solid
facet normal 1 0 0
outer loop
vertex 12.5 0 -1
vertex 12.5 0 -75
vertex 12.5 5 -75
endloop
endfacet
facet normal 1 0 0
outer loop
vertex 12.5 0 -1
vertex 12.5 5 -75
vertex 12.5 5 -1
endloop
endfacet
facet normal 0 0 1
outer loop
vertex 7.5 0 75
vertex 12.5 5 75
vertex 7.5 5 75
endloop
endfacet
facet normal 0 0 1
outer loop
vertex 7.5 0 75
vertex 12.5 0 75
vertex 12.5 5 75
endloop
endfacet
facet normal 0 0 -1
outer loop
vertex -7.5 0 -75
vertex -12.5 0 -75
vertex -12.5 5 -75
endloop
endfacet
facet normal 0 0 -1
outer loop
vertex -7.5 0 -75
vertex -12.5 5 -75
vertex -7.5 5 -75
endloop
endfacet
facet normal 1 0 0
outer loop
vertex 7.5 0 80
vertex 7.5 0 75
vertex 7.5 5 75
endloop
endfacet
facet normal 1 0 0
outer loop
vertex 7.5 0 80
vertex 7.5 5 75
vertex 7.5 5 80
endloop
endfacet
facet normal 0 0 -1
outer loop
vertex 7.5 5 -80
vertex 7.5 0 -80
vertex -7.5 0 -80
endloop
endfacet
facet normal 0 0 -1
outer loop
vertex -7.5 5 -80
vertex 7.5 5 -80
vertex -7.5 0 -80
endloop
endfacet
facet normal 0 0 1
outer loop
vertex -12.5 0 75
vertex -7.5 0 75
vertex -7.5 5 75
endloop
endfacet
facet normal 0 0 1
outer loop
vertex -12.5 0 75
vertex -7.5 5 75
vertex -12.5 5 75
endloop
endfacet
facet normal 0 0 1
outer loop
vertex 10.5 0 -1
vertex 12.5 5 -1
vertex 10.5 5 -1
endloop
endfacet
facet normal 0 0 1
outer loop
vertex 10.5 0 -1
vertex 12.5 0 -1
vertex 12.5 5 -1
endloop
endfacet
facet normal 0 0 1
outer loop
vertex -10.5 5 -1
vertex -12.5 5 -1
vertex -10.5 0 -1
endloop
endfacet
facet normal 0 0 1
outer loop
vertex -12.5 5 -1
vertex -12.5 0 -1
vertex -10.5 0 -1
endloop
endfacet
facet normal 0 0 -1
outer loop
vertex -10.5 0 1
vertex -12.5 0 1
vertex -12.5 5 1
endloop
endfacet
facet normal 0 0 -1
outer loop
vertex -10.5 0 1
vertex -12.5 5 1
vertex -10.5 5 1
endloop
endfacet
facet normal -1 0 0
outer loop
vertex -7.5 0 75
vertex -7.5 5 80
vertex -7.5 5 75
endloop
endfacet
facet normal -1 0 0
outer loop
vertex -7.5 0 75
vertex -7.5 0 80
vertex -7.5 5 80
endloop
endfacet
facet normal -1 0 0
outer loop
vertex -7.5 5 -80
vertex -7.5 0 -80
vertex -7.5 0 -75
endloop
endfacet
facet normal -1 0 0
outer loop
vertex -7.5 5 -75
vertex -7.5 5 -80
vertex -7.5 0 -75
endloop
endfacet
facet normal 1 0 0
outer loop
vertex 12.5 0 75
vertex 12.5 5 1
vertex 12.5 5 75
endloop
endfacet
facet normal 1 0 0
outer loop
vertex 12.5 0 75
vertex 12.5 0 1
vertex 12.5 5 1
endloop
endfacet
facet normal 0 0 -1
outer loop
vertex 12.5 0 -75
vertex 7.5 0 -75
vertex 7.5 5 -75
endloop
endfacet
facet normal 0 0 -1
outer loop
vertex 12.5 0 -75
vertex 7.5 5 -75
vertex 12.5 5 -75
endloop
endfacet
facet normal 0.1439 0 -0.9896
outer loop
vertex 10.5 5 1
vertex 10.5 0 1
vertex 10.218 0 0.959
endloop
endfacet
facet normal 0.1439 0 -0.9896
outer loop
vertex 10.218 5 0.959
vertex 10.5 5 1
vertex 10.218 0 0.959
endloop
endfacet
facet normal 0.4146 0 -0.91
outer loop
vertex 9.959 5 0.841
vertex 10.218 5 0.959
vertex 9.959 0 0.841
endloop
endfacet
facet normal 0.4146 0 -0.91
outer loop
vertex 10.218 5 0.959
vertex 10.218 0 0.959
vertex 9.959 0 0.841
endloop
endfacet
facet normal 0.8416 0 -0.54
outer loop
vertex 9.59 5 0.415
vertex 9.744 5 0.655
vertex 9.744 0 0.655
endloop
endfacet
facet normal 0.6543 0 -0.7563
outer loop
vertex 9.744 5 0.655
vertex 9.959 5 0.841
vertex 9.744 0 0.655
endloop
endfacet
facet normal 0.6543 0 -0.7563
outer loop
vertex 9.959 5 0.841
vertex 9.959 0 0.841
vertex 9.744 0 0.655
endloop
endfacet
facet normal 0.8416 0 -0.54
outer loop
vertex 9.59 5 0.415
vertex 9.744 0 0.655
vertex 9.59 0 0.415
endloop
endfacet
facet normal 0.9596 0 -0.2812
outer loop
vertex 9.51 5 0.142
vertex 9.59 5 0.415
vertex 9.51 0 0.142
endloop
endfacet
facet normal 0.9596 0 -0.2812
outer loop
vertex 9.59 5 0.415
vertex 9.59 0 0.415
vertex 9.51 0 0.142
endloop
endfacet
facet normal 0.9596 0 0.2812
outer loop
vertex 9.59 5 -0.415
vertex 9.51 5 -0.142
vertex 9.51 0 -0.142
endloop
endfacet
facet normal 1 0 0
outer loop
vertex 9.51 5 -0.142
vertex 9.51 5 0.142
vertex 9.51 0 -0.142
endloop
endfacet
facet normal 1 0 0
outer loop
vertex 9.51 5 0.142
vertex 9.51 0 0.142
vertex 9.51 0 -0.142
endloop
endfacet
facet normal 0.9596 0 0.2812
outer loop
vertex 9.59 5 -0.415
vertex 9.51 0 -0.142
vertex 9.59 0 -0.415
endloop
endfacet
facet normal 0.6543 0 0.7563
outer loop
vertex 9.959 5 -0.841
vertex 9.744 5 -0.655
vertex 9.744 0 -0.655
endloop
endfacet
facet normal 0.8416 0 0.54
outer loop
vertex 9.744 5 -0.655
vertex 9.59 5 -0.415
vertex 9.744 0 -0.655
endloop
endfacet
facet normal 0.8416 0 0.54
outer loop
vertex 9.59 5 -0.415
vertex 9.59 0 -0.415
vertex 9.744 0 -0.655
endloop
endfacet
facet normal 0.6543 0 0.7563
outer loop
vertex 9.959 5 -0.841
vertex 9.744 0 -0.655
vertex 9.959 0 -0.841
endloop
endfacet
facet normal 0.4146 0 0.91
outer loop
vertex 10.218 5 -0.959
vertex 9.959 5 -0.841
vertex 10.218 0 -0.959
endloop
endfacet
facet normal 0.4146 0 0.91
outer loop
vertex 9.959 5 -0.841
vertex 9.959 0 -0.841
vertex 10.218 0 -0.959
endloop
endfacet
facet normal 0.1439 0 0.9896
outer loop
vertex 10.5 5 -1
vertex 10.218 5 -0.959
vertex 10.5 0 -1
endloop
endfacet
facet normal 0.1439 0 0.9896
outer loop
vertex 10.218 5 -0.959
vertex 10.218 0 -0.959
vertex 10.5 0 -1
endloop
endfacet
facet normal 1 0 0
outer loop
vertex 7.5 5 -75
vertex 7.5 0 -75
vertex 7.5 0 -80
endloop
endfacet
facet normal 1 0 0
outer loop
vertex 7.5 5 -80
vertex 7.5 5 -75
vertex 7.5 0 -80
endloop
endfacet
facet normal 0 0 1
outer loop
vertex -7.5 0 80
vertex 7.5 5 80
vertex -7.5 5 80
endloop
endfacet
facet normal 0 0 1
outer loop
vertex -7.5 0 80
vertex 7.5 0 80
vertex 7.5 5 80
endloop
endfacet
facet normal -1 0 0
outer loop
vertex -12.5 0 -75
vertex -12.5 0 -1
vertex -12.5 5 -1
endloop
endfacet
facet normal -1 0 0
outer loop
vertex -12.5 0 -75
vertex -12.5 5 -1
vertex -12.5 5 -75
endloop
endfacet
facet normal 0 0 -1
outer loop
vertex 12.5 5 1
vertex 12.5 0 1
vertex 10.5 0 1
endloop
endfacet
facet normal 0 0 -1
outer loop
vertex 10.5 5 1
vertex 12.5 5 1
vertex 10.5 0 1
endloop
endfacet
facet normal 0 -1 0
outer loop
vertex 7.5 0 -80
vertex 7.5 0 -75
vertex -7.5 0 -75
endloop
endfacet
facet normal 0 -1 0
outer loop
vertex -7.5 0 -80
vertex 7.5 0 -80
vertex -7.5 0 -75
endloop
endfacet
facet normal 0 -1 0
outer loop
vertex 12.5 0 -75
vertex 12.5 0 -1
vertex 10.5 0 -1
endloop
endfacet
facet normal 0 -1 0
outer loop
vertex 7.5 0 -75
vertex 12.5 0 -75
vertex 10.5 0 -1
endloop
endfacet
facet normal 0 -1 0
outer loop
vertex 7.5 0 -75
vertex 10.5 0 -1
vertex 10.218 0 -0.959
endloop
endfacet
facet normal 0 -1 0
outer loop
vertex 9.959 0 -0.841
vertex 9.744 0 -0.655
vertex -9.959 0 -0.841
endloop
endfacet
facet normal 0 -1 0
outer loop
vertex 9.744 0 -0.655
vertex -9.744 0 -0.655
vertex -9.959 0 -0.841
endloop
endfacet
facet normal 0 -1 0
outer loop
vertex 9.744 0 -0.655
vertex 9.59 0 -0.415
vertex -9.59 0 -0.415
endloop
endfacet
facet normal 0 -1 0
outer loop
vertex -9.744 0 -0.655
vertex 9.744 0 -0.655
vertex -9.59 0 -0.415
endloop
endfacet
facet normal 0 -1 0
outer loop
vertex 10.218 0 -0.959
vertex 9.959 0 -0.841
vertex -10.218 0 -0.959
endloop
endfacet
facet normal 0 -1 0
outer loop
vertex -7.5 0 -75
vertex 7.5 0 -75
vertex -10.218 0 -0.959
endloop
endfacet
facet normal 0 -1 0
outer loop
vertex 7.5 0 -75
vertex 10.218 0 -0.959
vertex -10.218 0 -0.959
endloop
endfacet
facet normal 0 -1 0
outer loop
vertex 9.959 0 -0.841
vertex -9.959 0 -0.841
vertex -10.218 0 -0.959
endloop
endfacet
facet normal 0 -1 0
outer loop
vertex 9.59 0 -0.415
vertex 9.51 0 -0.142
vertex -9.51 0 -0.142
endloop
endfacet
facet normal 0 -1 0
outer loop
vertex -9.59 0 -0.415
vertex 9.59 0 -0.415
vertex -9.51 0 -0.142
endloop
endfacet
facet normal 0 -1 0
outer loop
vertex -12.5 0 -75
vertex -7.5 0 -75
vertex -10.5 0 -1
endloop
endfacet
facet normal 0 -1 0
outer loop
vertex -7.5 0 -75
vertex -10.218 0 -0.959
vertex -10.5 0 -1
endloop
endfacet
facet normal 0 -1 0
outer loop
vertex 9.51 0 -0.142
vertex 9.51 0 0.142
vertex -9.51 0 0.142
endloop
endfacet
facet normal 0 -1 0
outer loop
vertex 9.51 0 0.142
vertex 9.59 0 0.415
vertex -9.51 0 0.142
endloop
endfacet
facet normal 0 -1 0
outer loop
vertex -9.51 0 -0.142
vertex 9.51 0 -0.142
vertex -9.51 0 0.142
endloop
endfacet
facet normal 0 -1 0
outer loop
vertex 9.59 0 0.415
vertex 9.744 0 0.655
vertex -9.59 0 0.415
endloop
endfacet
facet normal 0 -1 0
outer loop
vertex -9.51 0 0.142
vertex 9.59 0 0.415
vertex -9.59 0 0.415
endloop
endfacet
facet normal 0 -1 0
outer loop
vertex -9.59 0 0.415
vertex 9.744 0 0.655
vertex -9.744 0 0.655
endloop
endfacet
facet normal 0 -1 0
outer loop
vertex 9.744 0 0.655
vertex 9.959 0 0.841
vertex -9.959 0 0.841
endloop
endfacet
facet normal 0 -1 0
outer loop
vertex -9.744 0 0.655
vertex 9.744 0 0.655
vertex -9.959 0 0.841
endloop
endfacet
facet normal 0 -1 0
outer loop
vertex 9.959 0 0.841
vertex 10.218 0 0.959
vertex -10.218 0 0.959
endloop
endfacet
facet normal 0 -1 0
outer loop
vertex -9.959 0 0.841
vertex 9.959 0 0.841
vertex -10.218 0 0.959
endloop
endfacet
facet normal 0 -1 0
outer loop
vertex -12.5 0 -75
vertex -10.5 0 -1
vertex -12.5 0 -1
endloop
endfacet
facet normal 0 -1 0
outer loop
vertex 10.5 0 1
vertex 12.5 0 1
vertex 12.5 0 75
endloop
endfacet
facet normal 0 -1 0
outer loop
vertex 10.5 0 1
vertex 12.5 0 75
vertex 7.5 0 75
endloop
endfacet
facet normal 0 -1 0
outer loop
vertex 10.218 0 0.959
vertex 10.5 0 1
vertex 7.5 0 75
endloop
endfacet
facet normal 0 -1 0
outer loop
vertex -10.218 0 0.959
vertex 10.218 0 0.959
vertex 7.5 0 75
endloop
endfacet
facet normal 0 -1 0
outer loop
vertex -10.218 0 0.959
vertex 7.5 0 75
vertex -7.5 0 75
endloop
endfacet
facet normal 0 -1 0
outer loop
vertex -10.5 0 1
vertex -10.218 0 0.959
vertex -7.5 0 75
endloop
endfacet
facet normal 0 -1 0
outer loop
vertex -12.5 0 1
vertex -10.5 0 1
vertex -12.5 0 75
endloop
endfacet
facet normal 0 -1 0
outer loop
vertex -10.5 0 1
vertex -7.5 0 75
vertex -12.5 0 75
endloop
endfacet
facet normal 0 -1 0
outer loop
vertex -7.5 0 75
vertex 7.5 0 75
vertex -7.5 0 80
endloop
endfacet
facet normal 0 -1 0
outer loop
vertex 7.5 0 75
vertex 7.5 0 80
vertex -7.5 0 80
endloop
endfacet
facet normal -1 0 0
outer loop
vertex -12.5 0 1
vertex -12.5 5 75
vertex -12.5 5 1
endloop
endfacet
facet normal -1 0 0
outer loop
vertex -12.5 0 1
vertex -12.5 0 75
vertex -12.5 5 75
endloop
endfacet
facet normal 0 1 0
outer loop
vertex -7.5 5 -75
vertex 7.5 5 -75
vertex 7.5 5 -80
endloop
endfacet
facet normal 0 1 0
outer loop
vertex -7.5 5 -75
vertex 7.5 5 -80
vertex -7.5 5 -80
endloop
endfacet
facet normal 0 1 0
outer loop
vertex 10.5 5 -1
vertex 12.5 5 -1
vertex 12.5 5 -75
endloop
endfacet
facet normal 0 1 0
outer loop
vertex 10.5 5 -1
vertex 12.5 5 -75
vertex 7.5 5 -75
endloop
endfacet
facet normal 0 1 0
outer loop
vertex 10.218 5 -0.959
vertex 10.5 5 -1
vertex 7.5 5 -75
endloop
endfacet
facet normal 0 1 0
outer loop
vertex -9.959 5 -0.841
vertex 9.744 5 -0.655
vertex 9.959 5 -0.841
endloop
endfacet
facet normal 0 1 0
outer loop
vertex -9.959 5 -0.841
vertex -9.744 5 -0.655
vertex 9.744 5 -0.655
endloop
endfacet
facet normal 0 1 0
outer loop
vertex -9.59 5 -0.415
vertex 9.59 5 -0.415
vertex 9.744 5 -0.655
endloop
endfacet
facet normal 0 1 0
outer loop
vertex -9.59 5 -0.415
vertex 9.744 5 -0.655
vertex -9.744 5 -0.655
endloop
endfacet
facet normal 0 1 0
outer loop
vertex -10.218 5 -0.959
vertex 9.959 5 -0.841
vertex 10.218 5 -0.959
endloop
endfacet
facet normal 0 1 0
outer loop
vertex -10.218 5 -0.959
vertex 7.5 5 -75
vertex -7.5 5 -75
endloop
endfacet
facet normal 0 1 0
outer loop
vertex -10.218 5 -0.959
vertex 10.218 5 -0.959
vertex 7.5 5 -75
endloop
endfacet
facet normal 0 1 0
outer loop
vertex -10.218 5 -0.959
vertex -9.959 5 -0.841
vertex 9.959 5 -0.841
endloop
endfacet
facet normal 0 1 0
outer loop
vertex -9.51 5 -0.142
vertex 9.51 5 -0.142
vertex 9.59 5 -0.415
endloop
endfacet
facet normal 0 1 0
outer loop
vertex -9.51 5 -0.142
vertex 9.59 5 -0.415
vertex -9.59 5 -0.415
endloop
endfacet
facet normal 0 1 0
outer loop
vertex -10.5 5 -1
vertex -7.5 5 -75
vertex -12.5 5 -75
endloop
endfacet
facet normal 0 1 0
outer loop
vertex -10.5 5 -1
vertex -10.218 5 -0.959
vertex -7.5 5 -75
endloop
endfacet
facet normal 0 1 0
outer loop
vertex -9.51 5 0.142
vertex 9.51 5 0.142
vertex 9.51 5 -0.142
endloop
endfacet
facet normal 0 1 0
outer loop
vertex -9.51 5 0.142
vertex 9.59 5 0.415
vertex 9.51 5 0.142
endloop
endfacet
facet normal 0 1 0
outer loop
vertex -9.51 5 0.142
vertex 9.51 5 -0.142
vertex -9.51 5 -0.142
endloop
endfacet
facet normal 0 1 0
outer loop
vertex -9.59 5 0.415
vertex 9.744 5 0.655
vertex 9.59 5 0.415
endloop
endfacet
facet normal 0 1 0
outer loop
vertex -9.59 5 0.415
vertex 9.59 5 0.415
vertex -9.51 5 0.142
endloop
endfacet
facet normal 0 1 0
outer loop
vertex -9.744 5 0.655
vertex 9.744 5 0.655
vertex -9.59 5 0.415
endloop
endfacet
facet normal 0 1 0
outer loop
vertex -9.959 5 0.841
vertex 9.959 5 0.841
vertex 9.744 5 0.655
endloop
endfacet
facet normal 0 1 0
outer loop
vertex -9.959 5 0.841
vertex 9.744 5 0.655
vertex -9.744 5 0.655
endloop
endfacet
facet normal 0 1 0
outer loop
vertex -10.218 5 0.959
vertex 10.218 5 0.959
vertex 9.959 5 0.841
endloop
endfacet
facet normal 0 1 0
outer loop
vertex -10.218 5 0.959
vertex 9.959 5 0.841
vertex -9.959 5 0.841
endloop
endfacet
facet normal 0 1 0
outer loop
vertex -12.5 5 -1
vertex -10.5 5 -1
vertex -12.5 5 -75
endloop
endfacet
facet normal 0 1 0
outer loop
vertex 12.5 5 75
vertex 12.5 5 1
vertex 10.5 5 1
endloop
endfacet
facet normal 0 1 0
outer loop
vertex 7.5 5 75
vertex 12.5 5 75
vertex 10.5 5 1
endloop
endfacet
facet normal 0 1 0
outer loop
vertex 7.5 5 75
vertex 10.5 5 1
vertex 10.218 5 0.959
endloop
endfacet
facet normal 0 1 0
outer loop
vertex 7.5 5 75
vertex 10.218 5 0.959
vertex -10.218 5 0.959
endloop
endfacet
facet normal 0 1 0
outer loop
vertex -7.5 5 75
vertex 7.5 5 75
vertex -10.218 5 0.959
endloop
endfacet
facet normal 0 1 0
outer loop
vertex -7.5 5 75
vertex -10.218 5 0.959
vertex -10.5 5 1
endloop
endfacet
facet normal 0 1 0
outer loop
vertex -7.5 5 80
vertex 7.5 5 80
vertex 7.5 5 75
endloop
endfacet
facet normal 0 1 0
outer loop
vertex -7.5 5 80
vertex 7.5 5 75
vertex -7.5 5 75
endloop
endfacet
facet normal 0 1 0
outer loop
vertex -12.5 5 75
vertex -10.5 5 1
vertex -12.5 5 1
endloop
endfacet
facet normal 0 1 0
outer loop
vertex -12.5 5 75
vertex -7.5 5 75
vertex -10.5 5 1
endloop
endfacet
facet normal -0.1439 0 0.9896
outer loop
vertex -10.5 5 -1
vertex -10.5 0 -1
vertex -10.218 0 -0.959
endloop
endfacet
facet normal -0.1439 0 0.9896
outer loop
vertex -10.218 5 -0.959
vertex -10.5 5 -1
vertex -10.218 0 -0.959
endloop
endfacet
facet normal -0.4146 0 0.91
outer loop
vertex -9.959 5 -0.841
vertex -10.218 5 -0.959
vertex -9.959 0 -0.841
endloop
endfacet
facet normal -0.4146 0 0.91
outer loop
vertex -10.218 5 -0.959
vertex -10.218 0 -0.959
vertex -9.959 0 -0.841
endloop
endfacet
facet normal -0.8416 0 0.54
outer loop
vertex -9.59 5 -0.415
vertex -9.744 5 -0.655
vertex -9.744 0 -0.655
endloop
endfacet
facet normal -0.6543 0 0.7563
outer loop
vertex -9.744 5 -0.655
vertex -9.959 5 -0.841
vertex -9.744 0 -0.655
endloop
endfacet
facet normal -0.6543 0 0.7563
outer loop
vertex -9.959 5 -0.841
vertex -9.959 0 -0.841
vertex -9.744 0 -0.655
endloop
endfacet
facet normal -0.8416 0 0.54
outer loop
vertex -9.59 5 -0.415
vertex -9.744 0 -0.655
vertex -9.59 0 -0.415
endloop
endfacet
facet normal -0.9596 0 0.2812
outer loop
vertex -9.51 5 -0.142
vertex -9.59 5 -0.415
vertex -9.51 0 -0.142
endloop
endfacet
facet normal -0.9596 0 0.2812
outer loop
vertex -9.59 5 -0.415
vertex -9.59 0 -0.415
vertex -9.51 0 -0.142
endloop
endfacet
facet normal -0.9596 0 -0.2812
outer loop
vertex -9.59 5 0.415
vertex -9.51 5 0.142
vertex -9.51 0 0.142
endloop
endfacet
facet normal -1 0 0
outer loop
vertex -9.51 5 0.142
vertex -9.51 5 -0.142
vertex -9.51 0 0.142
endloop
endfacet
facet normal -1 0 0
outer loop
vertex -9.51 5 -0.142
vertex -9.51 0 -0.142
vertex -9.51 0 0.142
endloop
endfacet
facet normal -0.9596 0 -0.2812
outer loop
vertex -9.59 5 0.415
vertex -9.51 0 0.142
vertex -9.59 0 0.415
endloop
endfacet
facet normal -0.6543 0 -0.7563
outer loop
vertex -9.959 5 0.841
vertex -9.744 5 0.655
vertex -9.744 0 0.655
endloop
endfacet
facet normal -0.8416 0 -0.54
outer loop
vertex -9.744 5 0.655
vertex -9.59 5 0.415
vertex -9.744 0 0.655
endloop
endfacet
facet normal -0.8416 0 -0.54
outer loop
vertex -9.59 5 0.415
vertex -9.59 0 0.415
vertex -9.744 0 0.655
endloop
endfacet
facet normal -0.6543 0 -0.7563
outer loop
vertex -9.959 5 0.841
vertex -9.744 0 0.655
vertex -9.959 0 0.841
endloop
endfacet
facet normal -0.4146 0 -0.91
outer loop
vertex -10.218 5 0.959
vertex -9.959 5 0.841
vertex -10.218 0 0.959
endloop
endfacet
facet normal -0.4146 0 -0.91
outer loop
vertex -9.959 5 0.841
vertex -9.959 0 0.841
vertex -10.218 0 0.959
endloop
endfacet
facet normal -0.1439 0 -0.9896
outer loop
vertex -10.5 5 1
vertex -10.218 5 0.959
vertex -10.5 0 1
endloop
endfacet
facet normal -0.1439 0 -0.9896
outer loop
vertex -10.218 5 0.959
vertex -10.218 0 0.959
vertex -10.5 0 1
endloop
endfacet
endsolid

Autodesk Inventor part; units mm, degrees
ref_plane "YZ Plane" through (0, 0, 0) normal (1, 0, 0) x (0, 1, 0)
ref_plane "XZ Plane" through (0, 0, 0) normal (0, 1, 0) x (-1, 0, 0)
ref_plane "XY Plane" through (0, 0, 0) normal (0, 0, 1) x (1, 0, 0)
sketch "Skizze1" plane through (0, 0, 0) normal (0, 1, 0) x (-1, 0, 0)
  line L0 (12.5, -75) -> (-12.5, -75)
  line L1 (-12.5, -75) -> (-12.5, 75)
  line L2 (-12.5, 75) -> (12.5, 75)
  line L3 (12.5, 75) -> (12.5, -75)
  line L4 (12.5, -75) -> (-12.5, 75) construction
  line L5 (12.5, 75) -> (-12.5, -75) construction
  line L6 (7.5, -75) -> (-7.5, -75)
  line L7 (-7.5, -75) -> (-7.5, -80)
  line L8 (-7.5, -80) -> (7.5, -80)
  line L9 (7.5, -80) -> (7.5, -75)
  line L10 (7.5, 75) -> (-7.5, 75)
  line L11 (-7.5, 75) -> (-7.5, 80)
  line L12 (-7.5, 80) -> (7.5, 80)
  line L13 (7.5, 80) -> (7.5, 75)
  line L14 (12.5, -1) -> (10.5, -1)
  line L15 (12.5, 1) -> (10.5, 1)
  line L16 (-12.5, -1) -> (-10.5, -1)
  line L17 (-12.5, 1) -> (-10.5, 1)
  arc A0 (10.5, 1) -> (10.5, -1) centre (10.5, 0) ccw
  arc A1 (-10.5, -1) -> (-10.5, 1) centre (-10.5, 0) ccw
  point P0 (0, 0)
  point P1 (0, 0)
  point P2 (7.5, -77.5)
  point P3 (0, 0)
  point P4 (-7.5, 75)
  point P5 (-7.5, -75)
  dimension "d0" = 150
  dimension "d1" = 5
  dimension "d2" = 5
  dimension "d3" = 5
  dimension "d4" = 15
  dimension "d5" = 2
  dimension "d6" = 2
  dimension "d7" = 1
extrude "Extrusion1" add sketch "Skizze1" along normal blind 5 contours L0 L1 L16 A1 L17 L2 L3 L15 A0 L14 | L9 L8 L7 L0 | L2 L11 L12 L13
equation "\"t\" = 15"
properties part number "Verbinder_t80"
